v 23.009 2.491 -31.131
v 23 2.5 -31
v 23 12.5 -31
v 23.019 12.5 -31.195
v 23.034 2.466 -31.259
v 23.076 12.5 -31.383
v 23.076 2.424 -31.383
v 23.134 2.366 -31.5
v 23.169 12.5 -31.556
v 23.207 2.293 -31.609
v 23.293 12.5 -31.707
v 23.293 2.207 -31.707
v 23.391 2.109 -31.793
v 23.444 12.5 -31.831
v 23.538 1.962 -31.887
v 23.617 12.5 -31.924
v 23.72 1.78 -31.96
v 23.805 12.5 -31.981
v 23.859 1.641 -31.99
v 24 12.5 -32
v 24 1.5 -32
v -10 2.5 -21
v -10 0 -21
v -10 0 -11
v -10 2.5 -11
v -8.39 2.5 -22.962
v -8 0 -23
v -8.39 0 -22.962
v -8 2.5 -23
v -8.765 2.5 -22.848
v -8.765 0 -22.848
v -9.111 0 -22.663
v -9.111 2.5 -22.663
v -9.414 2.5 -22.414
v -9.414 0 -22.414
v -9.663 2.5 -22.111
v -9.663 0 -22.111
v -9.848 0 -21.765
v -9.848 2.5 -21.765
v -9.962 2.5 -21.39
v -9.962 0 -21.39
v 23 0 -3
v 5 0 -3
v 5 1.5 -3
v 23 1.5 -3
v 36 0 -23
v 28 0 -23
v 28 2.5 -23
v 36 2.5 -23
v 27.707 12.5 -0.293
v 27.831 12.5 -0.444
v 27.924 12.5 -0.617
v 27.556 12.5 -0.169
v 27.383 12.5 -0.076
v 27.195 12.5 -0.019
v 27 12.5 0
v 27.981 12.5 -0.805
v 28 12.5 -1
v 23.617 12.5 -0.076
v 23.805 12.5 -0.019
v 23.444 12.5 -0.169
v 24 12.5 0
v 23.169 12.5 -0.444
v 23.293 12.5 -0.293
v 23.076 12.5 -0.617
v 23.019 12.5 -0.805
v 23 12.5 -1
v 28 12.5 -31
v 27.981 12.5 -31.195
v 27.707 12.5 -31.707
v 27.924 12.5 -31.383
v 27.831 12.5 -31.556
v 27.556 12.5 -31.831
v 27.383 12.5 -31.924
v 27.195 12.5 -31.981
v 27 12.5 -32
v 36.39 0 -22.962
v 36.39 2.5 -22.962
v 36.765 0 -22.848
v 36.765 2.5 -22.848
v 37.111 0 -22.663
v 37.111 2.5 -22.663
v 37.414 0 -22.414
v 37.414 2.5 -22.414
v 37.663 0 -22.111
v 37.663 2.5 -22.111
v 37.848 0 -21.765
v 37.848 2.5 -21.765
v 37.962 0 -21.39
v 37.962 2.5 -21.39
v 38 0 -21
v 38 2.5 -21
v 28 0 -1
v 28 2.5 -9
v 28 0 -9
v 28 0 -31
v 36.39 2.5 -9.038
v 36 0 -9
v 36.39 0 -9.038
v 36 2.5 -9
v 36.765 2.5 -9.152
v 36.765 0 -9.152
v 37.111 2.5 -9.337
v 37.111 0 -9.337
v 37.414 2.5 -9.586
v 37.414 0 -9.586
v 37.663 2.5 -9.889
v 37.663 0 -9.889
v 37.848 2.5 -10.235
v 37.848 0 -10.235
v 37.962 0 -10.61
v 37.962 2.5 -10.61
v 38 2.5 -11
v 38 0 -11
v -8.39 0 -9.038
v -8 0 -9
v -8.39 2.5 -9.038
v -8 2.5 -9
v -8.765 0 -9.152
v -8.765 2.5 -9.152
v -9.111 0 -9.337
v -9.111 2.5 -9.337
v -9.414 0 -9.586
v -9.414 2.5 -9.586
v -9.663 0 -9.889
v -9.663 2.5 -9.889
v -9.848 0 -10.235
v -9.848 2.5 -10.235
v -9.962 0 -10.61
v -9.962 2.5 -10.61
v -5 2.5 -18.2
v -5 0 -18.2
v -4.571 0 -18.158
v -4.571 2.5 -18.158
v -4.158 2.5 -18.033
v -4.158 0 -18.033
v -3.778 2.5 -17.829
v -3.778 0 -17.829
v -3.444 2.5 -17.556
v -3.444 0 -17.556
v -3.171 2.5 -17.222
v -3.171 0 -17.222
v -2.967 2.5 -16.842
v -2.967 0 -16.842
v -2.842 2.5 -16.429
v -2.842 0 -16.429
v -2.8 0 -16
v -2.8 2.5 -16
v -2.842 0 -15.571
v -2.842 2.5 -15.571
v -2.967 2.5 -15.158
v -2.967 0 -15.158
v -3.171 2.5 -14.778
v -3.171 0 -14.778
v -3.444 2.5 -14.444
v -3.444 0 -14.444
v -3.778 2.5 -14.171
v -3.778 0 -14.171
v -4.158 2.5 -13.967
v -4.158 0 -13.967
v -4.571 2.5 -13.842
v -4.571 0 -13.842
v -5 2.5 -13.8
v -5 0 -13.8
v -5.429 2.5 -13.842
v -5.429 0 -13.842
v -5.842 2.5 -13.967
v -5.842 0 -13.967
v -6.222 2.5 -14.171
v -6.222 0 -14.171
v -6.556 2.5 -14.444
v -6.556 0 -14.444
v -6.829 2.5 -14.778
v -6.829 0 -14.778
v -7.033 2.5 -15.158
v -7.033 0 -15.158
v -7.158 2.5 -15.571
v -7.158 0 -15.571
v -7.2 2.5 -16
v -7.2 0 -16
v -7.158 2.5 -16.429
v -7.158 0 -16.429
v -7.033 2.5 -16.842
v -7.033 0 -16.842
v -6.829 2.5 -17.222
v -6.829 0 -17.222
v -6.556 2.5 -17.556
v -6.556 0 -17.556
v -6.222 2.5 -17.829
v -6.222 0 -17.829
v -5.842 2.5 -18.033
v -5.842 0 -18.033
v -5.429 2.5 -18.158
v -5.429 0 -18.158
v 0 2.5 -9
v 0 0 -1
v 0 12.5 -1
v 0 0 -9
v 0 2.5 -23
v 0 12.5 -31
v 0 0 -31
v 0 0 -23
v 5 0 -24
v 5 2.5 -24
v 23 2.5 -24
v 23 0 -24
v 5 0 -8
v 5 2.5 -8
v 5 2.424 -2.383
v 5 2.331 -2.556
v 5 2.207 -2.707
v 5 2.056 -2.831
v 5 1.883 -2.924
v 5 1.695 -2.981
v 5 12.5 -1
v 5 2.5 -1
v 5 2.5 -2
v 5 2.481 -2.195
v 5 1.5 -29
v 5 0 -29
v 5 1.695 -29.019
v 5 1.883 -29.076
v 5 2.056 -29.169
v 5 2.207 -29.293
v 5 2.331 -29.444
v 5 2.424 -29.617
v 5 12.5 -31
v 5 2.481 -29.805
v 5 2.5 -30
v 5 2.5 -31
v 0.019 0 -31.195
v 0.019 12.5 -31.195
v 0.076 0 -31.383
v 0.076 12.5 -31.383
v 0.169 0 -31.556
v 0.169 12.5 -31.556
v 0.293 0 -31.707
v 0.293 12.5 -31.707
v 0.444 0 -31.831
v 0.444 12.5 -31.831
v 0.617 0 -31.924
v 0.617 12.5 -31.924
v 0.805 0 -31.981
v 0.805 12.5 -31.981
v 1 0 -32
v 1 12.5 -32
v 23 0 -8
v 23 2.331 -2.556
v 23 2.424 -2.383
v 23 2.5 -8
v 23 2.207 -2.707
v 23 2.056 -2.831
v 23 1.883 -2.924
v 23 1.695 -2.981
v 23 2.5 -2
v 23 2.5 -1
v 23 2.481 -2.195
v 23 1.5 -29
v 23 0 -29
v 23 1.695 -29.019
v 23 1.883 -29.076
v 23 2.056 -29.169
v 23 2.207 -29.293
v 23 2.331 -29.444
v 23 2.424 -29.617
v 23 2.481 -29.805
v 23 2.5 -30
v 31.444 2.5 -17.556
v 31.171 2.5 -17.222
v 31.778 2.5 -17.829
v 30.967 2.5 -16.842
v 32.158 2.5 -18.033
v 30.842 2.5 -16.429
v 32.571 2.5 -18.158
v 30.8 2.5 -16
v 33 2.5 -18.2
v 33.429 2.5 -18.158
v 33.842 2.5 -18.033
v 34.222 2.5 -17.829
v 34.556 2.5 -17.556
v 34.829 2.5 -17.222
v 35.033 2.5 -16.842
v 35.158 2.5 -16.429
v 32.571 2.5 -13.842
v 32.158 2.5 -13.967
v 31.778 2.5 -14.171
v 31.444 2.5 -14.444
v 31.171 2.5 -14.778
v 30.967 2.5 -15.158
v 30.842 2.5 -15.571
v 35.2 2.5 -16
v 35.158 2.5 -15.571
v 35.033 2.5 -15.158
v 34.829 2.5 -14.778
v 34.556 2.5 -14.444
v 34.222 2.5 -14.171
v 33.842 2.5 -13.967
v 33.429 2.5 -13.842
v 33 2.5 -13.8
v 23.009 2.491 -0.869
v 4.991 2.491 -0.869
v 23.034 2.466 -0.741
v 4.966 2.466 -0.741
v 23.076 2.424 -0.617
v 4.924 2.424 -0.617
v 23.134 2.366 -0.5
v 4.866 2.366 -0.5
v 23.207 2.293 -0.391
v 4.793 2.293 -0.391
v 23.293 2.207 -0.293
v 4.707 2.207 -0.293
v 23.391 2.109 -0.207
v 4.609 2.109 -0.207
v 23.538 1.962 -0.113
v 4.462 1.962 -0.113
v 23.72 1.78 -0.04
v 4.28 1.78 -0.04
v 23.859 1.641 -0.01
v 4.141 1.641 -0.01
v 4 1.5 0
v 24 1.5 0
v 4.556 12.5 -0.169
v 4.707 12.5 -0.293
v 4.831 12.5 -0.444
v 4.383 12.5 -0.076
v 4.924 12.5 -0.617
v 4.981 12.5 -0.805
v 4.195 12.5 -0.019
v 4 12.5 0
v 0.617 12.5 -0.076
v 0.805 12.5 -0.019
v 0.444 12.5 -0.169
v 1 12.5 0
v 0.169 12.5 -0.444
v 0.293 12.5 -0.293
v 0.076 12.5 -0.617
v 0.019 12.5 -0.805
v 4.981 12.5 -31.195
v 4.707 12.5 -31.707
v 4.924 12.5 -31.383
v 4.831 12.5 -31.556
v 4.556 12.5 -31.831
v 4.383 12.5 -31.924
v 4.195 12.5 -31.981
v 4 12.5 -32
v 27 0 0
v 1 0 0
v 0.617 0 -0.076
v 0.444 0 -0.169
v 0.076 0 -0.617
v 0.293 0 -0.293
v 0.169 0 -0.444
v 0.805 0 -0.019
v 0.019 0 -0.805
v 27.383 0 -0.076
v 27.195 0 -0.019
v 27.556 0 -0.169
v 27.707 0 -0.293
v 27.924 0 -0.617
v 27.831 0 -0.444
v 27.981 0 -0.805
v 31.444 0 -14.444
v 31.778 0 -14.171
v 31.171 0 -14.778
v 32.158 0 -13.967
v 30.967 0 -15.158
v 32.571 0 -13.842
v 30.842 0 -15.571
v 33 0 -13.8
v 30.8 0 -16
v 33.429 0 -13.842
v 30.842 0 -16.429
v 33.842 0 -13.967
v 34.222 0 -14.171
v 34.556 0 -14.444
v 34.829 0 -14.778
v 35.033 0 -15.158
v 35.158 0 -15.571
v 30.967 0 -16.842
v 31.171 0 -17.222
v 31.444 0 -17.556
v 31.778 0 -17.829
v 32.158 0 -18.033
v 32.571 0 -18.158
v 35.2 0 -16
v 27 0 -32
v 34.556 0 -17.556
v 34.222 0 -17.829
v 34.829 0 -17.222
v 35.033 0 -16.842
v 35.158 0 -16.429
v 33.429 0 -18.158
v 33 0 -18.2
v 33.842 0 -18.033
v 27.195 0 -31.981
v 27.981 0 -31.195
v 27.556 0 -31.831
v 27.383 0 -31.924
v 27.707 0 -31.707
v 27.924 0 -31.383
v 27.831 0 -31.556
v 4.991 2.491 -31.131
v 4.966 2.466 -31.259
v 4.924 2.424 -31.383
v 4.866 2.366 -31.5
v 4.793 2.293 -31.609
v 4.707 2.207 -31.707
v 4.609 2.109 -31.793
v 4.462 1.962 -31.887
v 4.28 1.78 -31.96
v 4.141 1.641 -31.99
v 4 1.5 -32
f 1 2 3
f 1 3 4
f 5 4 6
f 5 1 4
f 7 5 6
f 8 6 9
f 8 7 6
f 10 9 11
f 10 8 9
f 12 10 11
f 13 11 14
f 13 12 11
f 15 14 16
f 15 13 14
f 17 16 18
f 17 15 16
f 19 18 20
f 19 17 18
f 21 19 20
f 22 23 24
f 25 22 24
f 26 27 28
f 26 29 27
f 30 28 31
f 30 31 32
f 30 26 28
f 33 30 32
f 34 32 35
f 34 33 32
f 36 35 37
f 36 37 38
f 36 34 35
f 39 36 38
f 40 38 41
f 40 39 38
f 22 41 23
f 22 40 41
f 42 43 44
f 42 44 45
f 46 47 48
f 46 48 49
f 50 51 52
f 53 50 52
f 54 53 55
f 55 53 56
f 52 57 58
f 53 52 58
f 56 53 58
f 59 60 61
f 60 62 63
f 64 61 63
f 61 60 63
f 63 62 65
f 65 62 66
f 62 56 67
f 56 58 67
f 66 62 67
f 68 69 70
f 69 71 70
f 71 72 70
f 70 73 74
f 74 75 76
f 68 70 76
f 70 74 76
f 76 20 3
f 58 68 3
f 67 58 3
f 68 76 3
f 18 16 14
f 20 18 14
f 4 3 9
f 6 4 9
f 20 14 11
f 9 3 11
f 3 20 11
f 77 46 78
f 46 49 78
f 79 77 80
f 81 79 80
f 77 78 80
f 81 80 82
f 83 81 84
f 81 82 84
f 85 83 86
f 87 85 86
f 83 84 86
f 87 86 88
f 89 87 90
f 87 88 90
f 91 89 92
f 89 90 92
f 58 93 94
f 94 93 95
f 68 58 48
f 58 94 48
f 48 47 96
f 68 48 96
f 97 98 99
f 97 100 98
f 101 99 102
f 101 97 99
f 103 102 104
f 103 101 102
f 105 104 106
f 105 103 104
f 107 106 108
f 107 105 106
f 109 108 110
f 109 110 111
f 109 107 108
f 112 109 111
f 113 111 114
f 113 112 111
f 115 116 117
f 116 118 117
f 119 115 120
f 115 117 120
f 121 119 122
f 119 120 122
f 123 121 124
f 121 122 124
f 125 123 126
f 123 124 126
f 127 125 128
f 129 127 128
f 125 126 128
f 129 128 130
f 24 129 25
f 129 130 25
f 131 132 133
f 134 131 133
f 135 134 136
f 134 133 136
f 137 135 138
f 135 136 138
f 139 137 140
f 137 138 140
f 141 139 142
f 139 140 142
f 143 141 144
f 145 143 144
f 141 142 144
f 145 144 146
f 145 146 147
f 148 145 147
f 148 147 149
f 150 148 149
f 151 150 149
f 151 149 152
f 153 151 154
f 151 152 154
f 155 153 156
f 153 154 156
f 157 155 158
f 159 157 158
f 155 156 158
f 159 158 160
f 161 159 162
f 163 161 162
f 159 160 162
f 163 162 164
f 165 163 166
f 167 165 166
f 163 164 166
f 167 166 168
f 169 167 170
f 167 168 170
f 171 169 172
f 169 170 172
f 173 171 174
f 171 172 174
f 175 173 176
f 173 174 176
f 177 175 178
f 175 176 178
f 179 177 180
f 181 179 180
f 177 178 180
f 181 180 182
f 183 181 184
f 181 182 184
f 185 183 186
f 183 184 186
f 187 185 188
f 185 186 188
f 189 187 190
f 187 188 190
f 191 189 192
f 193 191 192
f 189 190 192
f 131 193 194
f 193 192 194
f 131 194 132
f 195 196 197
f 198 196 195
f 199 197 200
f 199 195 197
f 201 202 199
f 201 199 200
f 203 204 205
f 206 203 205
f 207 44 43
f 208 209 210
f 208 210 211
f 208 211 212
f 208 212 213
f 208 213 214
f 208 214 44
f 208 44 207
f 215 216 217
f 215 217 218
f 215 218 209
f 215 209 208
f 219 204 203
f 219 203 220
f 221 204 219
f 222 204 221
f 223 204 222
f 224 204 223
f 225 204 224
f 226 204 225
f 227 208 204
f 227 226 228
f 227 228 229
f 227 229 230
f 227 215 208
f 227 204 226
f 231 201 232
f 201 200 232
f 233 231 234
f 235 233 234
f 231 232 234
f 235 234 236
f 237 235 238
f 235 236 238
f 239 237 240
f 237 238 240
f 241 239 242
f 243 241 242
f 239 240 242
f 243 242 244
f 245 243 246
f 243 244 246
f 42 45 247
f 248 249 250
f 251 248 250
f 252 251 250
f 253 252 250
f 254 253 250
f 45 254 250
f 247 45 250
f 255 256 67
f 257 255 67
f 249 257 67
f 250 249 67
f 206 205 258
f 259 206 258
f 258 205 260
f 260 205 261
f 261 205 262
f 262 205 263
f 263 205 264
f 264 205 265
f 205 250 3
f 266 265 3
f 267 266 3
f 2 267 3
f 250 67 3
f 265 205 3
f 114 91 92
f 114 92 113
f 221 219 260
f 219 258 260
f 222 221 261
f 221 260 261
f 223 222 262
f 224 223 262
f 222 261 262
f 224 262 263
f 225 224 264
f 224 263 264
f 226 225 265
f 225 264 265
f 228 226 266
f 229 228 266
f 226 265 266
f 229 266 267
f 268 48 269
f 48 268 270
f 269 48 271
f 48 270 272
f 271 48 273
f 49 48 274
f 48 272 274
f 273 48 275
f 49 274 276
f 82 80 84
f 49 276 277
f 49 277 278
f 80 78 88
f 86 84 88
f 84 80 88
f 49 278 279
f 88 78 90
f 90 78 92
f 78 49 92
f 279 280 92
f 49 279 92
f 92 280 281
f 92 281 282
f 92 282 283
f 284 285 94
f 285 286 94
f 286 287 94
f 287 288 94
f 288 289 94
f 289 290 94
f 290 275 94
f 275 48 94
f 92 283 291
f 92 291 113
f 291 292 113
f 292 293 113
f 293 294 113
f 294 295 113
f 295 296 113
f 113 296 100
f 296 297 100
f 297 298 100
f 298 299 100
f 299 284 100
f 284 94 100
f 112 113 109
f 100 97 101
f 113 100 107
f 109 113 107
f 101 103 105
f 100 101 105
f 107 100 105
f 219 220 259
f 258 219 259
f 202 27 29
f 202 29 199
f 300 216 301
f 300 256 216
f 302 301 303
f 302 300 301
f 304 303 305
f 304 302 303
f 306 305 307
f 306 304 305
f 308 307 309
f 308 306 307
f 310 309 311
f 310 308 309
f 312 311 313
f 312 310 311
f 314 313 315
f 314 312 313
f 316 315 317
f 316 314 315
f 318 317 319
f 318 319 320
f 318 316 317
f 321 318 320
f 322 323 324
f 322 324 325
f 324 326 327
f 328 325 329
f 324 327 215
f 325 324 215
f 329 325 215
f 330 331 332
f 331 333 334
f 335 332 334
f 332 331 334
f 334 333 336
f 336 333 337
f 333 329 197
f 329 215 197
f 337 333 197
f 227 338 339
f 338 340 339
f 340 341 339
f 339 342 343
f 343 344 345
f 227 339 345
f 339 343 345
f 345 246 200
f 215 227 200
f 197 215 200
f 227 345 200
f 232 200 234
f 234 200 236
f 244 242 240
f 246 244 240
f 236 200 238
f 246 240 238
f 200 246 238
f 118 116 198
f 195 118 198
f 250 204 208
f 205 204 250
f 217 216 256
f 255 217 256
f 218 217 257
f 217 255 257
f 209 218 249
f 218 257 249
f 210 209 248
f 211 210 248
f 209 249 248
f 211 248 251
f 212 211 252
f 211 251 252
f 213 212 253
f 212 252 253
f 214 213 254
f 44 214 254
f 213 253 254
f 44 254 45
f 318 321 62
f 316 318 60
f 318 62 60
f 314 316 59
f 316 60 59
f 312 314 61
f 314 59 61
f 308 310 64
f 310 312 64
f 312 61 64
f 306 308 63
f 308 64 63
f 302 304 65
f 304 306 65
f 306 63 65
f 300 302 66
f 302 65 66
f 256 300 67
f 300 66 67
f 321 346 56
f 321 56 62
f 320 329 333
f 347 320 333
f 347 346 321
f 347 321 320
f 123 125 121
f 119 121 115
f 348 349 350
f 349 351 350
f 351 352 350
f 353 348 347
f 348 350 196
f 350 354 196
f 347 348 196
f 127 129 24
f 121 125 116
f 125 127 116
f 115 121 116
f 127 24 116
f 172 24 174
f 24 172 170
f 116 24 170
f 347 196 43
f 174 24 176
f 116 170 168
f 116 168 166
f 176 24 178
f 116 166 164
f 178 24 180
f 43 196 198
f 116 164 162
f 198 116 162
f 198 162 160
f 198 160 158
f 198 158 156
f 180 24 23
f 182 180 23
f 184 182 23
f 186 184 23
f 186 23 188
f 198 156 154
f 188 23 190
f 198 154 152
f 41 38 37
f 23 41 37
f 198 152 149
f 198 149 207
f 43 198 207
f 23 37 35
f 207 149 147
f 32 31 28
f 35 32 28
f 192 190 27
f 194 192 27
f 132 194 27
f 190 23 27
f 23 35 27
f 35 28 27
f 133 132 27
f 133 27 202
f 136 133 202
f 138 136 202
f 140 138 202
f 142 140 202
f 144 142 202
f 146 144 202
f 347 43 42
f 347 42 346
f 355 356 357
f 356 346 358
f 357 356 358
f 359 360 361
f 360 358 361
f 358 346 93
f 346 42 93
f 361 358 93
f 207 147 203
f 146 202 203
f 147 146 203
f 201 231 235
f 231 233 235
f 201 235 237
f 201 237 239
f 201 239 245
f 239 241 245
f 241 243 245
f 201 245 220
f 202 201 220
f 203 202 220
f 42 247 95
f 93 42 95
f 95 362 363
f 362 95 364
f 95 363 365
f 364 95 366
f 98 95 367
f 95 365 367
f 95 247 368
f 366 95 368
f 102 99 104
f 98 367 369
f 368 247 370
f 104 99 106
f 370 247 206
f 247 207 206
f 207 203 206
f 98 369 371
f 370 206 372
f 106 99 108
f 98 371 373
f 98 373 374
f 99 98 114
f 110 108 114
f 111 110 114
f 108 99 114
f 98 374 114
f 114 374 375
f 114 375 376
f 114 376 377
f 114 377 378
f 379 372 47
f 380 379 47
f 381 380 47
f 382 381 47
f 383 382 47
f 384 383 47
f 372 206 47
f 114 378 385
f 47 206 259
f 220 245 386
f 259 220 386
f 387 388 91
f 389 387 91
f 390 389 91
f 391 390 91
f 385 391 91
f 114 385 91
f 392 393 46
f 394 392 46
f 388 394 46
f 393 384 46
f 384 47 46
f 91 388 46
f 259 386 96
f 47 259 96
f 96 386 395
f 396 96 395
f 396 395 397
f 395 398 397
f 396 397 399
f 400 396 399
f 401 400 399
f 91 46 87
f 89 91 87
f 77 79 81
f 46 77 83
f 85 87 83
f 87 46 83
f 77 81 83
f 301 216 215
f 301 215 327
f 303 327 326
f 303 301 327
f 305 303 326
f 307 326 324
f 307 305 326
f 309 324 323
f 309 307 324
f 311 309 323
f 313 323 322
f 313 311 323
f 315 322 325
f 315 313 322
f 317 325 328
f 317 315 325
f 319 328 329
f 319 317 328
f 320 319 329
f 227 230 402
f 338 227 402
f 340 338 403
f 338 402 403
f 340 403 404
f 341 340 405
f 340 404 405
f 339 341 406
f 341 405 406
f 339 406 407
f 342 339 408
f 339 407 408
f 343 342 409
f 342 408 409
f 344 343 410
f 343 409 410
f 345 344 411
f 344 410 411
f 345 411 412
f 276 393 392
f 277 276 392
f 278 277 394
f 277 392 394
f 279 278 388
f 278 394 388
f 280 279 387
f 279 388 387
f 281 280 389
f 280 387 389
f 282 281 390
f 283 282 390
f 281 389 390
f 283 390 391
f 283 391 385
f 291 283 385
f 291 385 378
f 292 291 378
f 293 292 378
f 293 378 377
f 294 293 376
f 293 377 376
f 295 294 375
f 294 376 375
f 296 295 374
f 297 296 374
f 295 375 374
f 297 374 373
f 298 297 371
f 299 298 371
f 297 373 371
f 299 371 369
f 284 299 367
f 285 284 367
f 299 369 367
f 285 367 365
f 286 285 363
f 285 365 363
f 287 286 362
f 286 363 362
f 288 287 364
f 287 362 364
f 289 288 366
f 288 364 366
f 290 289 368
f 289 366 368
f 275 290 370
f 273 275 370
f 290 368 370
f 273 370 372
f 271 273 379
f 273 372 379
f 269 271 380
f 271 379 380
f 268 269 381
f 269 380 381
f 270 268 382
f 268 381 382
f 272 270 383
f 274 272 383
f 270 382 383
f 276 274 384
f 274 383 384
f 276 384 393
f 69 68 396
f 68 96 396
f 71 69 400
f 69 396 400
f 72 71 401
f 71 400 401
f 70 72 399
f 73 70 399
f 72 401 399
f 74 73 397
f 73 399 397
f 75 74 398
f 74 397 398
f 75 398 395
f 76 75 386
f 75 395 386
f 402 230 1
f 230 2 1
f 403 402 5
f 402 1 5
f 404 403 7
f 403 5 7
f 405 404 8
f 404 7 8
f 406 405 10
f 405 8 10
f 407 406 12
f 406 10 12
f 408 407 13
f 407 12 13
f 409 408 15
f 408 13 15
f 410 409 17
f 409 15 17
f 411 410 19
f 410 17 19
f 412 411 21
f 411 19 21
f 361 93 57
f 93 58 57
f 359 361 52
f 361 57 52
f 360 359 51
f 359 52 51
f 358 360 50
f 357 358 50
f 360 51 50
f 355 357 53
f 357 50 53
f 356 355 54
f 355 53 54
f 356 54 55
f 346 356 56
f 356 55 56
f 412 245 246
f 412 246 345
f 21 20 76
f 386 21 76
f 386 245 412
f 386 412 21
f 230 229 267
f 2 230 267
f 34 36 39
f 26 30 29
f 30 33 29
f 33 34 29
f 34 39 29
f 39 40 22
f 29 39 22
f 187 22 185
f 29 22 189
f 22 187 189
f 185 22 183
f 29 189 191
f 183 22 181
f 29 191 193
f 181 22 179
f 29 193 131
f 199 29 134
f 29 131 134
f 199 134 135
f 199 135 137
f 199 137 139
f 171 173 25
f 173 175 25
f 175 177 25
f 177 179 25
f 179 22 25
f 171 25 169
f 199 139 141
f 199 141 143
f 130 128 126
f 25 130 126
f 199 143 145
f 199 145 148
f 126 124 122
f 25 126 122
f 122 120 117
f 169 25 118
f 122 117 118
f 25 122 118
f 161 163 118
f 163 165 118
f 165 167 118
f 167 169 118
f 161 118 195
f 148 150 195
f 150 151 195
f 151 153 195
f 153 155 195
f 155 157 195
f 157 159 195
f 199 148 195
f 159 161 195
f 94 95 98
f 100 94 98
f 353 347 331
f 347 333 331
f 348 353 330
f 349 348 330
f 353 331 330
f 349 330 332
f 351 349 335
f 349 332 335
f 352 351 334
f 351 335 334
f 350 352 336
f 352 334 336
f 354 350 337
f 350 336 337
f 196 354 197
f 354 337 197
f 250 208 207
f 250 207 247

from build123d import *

# Parameters (mm, degrees)
SKETCH1_W           = 28
SKETCH1_H           = 32
BOSS_EXTRUDE1_DEPTH = 2.5
BOSS_EXTRUDE3_DEPTH = 10
SKETCH3_W           = 18
SKETCH3_H           = 8
CUT_EXTRUDE1_DEPTH  = 2.5
SKETCH4_W           = 10
SKETCH4_H           = 14
SKETCH4_R           = 2.2
BOSS_EXTRUDE4_DEPTH = 2.5
FILLET1_R           = 2
FILLET2_R           = 1
SKETCH5_W           = 24.202572411
SKETCH5_H           = 3
SKETCH5_W_2         = 23.282926667
BOSS_EXTRUDE5_DEPTH = 2.5
FILLET3_R           = 1


with BuildPart() as part:
    # Sketch1 → Boss-Extrude1 (new body)
    with BuildSketch(Plane(origin=(0, 0, 0), x_dir=(1, 0, 0), z_dir=(0, 1, 0))):
        with Locations((14, 16)):
            Rectangle(SKETCH1_W, SKETCH1_H)
    extrude(amount=BOSS_EXTRUDE1_DEPTH)

    # Sketch2 → Boss-Extrude3 (add)
    with BuildSketch(Plane(origin=(0, 2.5, 0), x_dir=(1, 0, 0), z_dir=(0, 1, 0))):
        Polygon((0, 32), (5, 32), (5, 30), (5, 0), (0, 0), align=None)
        Polygon((28, 0), (23, 0), (23, 30), (23, 32), (28, 32), align=None)
    extrude(amount=BOSS_EXTRUDE3_DEPTH)

    # Sketch3 → Cut-Extrude1 (cut)
    with BuildSketch(Plane(origin=(0, 2.5, 0), x_dir=(1, 0, 0), z_dir=(0, 1, 0))):
        with Locations((14, 28)):
            Rectangle(SKETCH3_W, SKETCH3_H)
        with Locations((14, 4)):
            Rectangle(SKETCH3_W, SKETCH3_H)
    extrude(amount=-CUT_EXTRUDE1_DEPTH, mode=Mode.SUBTRACT)

    # Sketch4 → Boss-Extrude4 (add)
    # profile 1 of 2: a face of its own
    with BuildSketch(Plane.XZ):
        with Locations((-5, -16)):
            Rectangle(SKETCH4_W, SKETCH4_H)
        with Locations(Location((-5, -16, 0), (0, 0, 270))):
            Circle(SKETCH4_R, mode=Mode.SUBTRACT)
    # profile 2 of 2: a face of its own
    with BuildSketch(Plane.XZ):
        with Locations((33, -16)):
            Rectangle(SKETCH4_W, SKETCH4_H)
        with Locations(Location((33, -16, 0), (0, 0, 270))):
            Circle(SKETCH4_R, mode=Mode.SUBTRACT)
    extrude(amount=-BOSS_EXTRUDE4_DEPTH)

    # Fillet1
    fillet1_edges = [part.edges().sort_by_distance(p)[0] for p in [
        (-10, 1.25, -23),
        (-10, 1.25, -9),
        (38, 1.25, -9),
        (38, 1.25, -23),
    ]]
    fillet(fillet1_edges, radius=FILLET1_R)

    # Fillet2
    fillet2_edges = [part.edges().sort_by_distance(p)[0] for p in [
        (23, 6.25, -32),
        (23, 6.25, 0),
        (5, 6.25, 0),
        (5, 6.25, -32),
        (0, 6.25, -32),
        (28, 6.25, -32),
        (28, 6.25, 0),
        (0, 6.25, 0),
    ]]
    fillet(fillet2_edges, radius=FILLET2_R)

    # Sketch5 → Boss-Extrude5 (add)
    with BuildSketch(Plane.XZ):
        with Locations((14.601286206, -1.5)):
            Rectangle(SKETCH5_W, SKETCH5_H)
        with Locations((14.141463334, -30.5)):
            Rectangle(SKETCH5_W_2, SKETCH5_H)
    extrude(amount=-BOSS_EXTRUDE5_DEPTH)

    # Fillet3
    fillet3_edges = [part.edges().sort_by_distance(p)[0] for p in [
        (14, 2.5, -3),
        (14, 2.5, 0),
        (14, 2.5, -32),
        (14, 2.5, -29),
    ]]
    fillet(fillet3_edges, radius=FILLET3_R)


solid = part.part
